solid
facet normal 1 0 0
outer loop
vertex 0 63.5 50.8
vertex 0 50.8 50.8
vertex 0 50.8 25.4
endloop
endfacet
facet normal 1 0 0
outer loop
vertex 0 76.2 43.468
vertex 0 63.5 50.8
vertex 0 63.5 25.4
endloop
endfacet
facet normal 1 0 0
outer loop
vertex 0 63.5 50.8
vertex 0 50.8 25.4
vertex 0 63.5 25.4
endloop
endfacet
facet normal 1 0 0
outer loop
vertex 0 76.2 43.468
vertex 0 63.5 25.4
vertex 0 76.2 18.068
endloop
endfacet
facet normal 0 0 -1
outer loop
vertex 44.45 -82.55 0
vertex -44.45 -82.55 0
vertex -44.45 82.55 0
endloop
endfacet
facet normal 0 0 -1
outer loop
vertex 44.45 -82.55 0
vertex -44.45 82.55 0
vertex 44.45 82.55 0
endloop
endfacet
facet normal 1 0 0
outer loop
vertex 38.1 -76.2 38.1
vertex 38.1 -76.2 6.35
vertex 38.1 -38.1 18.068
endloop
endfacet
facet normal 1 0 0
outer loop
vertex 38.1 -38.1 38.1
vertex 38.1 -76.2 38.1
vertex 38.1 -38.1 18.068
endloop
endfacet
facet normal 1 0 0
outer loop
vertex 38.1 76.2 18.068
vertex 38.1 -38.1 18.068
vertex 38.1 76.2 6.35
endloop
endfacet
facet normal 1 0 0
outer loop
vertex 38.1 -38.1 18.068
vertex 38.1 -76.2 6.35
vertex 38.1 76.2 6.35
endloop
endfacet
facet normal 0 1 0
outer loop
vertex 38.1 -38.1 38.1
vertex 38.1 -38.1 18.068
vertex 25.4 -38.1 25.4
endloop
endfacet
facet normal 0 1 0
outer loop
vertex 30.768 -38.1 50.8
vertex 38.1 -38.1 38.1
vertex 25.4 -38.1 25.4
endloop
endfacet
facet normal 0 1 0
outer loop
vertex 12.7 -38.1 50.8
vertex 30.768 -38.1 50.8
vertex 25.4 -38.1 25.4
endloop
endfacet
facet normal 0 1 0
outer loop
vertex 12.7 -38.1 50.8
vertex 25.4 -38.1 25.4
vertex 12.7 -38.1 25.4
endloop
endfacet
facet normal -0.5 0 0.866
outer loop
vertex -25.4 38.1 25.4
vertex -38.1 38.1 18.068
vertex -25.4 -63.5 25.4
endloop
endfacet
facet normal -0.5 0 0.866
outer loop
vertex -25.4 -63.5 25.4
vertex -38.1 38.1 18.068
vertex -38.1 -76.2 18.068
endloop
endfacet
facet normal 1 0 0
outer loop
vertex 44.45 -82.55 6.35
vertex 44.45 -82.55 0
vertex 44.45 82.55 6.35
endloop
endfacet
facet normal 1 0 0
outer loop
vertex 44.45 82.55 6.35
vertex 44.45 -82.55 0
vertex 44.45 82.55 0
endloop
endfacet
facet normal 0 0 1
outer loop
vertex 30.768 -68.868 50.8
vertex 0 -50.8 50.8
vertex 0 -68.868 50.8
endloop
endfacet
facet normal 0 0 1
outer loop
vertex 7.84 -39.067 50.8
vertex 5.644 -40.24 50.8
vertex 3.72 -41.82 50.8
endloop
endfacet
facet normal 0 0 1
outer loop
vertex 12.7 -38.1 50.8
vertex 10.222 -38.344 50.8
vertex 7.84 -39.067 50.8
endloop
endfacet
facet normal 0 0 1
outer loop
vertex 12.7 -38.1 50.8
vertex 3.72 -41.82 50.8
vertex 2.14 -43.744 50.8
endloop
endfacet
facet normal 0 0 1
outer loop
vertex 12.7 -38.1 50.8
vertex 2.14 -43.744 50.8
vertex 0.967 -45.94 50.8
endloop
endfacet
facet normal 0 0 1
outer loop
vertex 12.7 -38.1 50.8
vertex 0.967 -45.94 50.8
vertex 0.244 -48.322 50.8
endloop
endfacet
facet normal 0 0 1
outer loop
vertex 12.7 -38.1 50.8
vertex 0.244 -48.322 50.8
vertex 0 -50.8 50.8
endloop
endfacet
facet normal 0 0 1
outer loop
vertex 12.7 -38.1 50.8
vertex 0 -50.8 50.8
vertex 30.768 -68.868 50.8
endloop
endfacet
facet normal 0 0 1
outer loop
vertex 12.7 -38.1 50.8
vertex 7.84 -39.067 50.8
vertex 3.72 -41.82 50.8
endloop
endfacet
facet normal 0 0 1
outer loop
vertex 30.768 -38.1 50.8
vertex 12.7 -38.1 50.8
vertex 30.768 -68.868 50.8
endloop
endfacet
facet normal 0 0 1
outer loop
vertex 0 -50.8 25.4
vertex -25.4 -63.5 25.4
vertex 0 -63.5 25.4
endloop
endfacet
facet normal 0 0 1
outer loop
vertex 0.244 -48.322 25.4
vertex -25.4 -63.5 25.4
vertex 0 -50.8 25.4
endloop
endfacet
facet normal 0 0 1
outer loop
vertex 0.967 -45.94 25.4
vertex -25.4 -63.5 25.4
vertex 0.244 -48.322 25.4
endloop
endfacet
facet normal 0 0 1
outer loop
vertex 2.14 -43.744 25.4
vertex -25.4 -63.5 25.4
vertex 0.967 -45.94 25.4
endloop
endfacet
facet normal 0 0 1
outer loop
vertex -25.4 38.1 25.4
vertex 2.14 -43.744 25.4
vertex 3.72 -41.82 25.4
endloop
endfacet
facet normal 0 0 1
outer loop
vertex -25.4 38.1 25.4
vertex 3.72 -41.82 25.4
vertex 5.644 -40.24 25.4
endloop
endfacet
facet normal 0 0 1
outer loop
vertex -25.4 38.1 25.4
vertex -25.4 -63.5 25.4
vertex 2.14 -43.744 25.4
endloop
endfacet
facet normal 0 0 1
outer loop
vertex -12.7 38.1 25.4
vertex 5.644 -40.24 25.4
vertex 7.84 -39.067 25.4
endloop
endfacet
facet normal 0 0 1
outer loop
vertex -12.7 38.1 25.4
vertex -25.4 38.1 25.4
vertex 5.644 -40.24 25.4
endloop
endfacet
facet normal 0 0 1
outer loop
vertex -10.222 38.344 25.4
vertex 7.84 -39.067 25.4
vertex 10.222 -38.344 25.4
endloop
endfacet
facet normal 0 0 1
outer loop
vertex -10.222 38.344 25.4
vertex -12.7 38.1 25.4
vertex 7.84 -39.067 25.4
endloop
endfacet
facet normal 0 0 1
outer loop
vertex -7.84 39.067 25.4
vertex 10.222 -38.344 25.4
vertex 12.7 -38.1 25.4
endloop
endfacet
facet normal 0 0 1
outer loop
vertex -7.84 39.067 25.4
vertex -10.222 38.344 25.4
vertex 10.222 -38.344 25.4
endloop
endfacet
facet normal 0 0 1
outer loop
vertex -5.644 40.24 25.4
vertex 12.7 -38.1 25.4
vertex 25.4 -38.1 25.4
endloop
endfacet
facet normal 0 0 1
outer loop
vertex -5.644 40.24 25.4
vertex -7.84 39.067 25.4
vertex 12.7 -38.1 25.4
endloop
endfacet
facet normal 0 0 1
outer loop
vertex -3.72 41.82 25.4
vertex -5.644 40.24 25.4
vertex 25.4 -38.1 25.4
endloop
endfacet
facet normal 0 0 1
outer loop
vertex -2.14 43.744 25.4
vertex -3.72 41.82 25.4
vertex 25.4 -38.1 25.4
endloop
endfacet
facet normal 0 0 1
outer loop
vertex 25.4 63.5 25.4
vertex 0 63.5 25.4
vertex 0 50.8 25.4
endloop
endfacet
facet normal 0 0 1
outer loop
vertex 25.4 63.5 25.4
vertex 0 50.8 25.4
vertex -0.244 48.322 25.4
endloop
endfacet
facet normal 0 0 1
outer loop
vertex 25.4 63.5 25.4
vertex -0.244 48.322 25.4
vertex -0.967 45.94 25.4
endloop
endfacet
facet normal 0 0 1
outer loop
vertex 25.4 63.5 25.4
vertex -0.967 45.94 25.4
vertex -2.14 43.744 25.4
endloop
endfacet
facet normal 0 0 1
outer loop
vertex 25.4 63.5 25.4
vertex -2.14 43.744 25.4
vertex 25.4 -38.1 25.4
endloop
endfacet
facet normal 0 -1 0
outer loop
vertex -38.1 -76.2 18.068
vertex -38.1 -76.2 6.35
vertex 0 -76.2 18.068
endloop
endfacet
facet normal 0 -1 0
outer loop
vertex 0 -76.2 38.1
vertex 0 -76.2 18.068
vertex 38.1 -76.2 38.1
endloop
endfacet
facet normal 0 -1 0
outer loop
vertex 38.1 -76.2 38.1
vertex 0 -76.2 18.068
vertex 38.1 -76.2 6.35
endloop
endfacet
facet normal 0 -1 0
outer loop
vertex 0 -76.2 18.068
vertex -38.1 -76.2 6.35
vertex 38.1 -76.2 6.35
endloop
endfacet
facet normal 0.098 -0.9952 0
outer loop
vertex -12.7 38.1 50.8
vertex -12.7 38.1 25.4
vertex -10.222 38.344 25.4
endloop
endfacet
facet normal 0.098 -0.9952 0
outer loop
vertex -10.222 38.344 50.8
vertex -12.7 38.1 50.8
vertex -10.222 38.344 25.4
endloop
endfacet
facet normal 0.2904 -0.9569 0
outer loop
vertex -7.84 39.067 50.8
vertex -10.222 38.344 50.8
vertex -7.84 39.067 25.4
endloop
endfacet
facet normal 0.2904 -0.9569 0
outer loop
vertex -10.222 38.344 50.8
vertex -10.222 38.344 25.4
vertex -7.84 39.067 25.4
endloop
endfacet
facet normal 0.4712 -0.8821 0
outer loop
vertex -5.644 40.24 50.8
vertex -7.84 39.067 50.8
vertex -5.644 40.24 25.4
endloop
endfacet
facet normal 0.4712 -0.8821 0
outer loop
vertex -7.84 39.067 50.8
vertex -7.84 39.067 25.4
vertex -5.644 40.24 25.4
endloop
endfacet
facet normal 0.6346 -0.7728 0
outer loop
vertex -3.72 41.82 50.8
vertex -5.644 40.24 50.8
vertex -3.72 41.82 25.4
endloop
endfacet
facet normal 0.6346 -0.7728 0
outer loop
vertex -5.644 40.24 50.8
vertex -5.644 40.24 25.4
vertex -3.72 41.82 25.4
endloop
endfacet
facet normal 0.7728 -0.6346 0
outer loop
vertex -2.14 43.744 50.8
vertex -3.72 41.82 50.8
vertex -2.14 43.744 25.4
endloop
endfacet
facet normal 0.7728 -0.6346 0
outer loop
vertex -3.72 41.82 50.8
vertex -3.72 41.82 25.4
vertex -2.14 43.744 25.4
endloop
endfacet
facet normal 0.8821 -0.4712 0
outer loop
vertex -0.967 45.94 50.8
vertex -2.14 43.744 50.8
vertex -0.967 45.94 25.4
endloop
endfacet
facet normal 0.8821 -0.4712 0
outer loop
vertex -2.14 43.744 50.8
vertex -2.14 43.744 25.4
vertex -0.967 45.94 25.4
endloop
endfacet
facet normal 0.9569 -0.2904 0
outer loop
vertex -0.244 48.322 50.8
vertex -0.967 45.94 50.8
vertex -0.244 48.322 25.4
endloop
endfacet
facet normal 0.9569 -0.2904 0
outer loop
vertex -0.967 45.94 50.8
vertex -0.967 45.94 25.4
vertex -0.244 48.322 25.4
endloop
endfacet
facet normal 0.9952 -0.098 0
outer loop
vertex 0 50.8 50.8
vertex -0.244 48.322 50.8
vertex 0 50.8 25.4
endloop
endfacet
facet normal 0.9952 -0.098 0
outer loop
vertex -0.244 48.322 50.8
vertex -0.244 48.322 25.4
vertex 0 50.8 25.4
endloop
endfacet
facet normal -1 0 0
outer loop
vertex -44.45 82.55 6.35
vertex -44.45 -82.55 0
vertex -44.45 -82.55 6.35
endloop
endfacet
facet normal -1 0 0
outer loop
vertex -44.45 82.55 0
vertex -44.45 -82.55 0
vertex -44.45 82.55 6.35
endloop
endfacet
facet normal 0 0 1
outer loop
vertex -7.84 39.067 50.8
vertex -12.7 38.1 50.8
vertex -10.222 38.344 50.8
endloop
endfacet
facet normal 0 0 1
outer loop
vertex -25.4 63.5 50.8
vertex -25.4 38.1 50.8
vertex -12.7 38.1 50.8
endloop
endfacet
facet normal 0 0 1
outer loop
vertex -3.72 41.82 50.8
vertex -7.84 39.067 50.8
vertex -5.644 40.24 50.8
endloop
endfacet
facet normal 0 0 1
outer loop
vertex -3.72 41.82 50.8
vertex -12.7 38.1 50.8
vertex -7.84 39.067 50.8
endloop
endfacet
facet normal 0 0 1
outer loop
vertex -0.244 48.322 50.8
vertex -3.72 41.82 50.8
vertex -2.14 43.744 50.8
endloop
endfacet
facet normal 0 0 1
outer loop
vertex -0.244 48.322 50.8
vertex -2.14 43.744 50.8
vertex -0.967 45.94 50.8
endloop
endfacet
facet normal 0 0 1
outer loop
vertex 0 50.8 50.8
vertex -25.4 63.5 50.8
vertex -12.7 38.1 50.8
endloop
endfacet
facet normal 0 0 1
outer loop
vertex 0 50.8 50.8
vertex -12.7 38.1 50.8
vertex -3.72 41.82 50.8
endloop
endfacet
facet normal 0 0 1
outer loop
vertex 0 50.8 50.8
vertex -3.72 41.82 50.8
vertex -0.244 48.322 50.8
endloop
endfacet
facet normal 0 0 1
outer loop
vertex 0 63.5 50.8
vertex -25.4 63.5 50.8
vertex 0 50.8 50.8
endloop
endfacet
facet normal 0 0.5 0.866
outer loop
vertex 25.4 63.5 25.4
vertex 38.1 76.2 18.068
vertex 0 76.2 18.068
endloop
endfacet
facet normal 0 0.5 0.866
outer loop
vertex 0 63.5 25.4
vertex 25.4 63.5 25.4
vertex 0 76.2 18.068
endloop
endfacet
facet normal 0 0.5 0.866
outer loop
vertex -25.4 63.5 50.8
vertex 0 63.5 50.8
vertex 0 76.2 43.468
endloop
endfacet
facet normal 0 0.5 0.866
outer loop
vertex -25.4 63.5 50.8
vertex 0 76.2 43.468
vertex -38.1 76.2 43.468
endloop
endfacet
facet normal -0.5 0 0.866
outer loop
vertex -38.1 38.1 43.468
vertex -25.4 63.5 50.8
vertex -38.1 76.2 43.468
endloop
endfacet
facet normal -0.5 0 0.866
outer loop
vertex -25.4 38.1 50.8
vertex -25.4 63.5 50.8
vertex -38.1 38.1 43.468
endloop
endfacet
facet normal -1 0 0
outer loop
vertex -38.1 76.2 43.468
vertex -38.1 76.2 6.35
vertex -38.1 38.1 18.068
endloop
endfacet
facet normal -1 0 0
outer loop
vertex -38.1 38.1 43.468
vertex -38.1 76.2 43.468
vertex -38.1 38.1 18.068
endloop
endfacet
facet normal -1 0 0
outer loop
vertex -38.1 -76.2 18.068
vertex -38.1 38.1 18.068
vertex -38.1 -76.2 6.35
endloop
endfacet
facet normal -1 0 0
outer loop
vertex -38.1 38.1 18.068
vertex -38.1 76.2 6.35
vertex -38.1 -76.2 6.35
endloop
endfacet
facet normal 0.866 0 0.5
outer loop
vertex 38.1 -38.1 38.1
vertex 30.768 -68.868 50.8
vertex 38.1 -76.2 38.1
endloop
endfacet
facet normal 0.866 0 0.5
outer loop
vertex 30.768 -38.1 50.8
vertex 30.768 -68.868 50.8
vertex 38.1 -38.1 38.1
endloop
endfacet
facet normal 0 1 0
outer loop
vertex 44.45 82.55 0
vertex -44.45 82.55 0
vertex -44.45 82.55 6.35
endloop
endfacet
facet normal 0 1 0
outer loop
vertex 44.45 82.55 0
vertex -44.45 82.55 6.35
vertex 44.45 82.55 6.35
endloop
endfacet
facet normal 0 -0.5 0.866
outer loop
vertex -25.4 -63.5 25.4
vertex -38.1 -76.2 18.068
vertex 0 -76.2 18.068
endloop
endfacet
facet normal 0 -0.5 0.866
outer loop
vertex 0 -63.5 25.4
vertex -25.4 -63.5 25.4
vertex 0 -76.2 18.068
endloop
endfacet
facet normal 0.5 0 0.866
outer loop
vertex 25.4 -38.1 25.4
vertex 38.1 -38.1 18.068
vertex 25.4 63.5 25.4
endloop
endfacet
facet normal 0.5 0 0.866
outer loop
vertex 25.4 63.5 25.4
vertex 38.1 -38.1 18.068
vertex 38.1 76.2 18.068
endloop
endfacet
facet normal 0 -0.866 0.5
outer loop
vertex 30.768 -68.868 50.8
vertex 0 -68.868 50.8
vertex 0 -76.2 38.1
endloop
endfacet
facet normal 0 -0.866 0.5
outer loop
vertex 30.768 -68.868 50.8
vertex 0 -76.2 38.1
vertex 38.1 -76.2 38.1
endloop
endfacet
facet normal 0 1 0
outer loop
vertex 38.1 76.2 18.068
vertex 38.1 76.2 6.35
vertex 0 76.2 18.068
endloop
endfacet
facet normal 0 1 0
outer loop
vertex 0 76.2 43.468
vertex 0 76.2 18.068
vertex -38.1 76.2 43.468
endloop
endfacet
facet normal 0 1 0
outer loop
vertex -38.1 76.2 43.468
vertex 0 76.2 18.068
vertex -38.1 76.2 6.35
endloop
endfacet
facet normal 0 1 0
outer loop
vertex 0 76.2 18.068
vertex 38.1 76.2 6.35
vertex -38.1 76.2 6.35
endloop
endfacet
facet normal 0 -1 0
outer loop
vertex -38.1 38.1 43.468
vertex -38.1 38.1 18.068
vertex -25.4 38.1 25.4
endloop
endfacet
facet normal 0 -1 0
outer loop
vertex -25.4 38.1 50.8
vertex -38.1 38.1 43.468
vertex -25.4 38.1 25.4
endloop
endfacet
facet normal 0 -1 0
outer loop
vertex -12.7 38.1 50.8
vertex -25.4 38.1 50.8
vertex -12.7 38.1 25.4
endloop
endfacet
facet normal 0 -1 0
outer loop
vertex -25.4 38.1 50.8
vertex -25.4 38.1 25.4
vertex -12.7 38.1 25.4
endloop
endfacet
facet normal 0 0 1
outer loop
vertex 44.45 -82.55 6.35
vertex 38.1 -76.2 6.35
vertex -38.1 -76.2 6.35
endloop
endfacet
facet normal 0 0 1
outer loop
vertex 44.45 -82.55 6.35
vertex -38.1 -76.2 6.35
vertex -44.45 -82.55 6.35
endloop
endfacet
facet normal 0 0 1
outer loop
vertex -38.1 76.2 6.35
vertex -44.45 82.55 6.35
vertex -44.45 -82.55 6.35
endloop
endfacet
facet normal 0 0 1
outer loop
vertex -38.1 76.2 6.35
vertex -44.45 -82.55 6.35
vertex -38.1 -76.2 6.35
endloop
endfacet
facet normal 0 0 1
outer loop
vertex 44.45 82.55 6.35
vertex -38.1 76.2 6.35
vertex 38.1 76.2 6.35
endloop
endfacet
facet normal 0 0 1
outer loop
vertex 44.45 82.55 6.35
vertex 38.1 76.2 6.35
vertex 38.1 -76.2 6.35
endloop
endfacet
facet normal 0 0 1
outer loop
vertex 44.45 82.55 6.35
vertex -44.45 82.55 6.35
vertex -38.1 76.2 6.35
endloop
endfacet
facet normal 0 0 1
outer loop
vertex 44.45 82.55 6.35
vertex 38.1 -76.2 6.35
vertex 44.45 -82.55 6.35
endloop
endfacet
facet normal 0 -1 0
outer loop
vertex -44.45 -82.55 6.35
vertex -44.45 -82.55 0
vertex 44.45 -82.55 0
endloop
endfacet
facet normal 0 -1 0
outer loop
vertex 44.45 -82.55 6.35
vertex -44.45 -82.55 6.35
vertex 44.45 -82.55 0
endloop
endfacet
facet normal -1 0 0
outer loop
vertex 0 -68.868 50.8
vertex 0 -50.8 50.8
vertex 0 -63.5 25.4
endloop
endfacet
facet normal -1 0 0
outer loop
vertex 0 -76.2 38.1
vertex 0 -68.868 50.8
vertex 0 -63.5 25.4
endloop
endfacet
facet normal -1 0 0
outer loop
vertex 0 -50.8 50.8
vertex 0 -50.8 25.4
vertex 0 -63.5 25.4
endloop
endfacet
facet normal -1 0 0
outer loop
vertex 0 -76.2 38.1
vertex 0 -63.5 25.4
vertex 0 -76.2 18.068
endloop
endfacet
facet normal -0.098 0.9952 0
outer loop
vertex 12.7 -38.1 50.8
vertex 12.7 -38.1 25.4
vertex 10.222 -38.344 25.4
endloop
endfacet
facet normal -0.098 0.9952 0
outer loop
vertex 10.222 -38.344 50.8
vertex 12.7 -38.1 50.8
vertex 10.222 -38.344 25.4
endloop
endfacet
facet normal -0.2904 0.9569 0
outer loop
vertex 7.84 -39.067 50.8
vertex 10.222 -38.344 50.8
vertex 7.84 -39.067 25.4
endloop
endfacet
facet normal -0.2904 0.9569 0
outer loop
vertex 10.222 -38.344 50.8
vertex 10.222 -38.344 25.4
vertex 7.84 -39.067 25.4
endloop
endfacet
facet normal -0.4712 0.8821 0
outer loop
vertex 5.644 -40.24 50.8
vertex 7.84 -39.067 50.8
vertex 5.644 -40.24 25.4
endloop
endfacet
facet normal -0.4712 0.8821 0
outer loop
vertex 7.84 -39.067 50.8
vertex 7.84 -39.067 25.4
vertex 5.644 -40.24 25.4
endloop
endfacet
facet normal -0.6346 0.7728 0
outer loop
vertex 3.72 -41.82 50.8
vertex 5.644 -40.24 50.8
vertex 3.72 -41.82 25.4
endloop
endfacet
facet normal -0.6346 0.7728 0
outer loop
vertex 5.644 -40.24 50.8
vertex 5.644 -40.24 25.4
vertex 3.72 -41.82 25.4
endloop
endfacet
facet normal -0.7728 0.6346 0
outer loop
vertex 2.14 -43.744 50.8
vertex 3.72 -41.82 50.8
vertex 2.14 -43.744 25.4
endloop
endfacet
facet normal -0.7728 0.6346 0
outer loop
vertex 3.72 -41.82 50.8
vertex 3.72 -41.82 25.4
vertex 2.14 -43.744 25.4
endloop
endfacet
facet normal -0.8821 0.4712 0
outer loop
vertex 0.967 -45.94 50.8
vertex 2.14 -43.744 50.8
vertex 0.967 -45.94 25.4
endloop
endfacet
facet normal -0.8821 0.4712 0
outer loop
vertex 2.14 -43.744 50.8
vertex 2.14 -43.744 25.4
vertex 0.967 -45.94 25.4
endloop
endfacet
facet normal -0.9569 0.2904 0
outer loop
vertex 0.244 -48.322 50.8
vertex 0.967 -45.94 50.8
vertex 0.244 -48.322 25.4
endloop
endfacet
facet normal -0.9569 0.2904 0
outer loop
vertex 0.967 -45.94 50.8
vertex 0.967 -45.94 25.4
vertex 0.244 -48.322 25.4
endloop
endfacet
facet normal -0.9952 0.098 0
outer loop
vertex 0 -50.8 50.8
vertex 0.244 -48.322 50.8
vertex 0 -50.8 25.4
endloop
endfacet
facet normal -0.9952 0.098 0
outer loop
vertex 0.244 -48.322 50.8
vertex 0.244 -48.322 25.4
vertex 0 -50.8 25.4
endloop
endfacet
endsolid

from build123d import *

# Parameters (mm, degrees)
F0_W        = 88.9
F0_H        = 165.1
F1_DEPTH    = 6.35
F2_DEPTH    = 25.4
F3_DEPTH    = 50.8
F4_SIZE2    = 7.3323484187
F4_SIZE     = 12.7
F5_C1_SIZE2 = 12.7
F5_C1_SIZE  = 7.3323484187
F5_C2_SIZE2 = 7.3323484187
F5_C2_SIZE  = 12.7
F5_C3_SIZE2 = 12.7
F5_C3_SIZE  = 7.3323484187
F5_C4_SIZE2 = 7.3323484187
F5_C4_SIZE  = 12.7


with BuildPart() as f1:
    # F0 (on Top) → F1 (new body)
    with BuildSketch(Plane.XY):
        Rectangle(F0_W, F0_H)
        Polygon((0, 76.2), (38.1, 76.2), (38.1, -38.1), (38.1, -76.2), (0, -76.2), (-38.1, -76.2), (-38.1, 38.1), (-38.1, 76.2), align=None, mode=Mode.SUBTRACT)
    extrude(amount=F1_DEPTH)

    # F0 (on Top) → F2 (join)
    with BuildSketch(Plane.XY):
        with BuildLine():
            Line((38.1, -38.1), (38.1, 76.2))
            Line((38.1, 76.2), (0, 76.2))
            Line((0, 76.2), (0, 50.8))
            ThreePointArc((0, 50.8), (-3.7197438789, 41.8197438789), (-12.7, 38.1))
            Line((-12.7, 38.1), (-38.1, 38.1))
            Line((-38.1, 38.1), (-38.1, -76.2))
            Line((-38.1, -76.2), (0, -76.2))
            Line((0, -76.2), (0, -50.8))
            ThreePointArc((0, -50.8), (3.7197438789, -41.8197438789), (12.7, -38.1))
            Line((12.7, -38.1), (38.1, -38.1))
        make_face()
    extrude(amount=F2_DEPTH)

    # F0 (on Top) → F3 (join)
    with BuildSketch(Plane.XY):
        with BuildLine():
            Line((0, 50.8), (0, 76.2))
            Line((0, 76.2), (-38.1, 76.2))
            Line((-38.1, 76.2), (-38.1, 38.1))
            Line((-38.1, 38.1), (-12.7, 38.1))
            ThreePointArc((-12.7, 38.1), (-3.7197438789, 41.8197438789), (0, 50.8))
        make_face()
        with BuildLine():
            Line((38.1, -76.2), (38.1, -38.1))
            Line((38.1, -38.1), (12.7, -38.1))
            ThreePointArc((12.7, -38.1), (3.7197438789, -41.8197438789), (0, -50.8))
            Line((0, -50.8), (0, -76.2))
            Line((0, -76.2), (38.1, -76.2))
        make_face()
    extrude(amount=F3_DEPTH)

    # F4
    f4_edges = [f1.edges().sort_by_distance(p)[0] for p in [
        (-38.1, -19.05, 25.4),
        (19.05, 76.2, 25.4),
        (38.1, 19.05, 25.4),
        (-19.05, -76.2, 25.4),
    ]]
    f4_side = f1.faces().sort_by_distance((0, 0, 25.4))[0]
    chamfer(f4_edges, length=F4_SIZE, length2=F4_SIZE2, reference=f4_side)

    # F5: chamfer of 12.7 x 7.3323484187 on 4 edges, made by hand

    # F5_c1
    f5_c1_edges = [f1.edges().sort_by_distance(p)[0] for p in [
        (-38.1, 57.15, 50.8),
    ]]
    f5_c1_side = f1.faces().sort_by_distance((-38.1, 57.15, 50.6533530316))[0]
    chamfer(f5_c1_edges, length=F5_C1_SIZE, length2=F5_C1_SIZE2, reference=f5_c1_side)

    # F5_c2
    f5_c2_edges = [f1.edges().sort_by_distance(p)[0] for p in [
        (19.05, -76.2, 50.8),
    ]]
    f5_c2_side = f1.faces().sort_by_distance((19.05, -76.2, 50.6533530316))[0]
    chamfer(f5_c2_edges, length=F5_C2_SIZE, length2=F5_C2_SIZE2, reference=f5_c2_side)

    # F5_c3
    f5_c3_edges = [f1.edges().sort_by_distance(p)[0] for p in [
        (-12.7, 76.2, 50.8),
    ]]
    f5_c3_side = f1.faces().sort_by_distance((-12.7, 76.2, 50.6533530316))[0]
    chamfer(f5_c3_edges, length=F5_C3_SIZE, length2=F5_C3_SIZE2, reference=f5_c3_side)

    # F5_c4
    f5_c4_edges = [f1.edges().sort_by_distance(p)[0] for p in [
        (38.1, -53.4838257906, 50.8),
    ]]
    f5_c4_side = f1.faces().sort_by_distance((38.1, -53.4838257906, 50.6533530316))[0]
    chamfer(f5_c4_edges, length=F5_C4_SIZE, length2=F5_C4_SIZE2, reference=f5_c4_side)


solid = f1.part
